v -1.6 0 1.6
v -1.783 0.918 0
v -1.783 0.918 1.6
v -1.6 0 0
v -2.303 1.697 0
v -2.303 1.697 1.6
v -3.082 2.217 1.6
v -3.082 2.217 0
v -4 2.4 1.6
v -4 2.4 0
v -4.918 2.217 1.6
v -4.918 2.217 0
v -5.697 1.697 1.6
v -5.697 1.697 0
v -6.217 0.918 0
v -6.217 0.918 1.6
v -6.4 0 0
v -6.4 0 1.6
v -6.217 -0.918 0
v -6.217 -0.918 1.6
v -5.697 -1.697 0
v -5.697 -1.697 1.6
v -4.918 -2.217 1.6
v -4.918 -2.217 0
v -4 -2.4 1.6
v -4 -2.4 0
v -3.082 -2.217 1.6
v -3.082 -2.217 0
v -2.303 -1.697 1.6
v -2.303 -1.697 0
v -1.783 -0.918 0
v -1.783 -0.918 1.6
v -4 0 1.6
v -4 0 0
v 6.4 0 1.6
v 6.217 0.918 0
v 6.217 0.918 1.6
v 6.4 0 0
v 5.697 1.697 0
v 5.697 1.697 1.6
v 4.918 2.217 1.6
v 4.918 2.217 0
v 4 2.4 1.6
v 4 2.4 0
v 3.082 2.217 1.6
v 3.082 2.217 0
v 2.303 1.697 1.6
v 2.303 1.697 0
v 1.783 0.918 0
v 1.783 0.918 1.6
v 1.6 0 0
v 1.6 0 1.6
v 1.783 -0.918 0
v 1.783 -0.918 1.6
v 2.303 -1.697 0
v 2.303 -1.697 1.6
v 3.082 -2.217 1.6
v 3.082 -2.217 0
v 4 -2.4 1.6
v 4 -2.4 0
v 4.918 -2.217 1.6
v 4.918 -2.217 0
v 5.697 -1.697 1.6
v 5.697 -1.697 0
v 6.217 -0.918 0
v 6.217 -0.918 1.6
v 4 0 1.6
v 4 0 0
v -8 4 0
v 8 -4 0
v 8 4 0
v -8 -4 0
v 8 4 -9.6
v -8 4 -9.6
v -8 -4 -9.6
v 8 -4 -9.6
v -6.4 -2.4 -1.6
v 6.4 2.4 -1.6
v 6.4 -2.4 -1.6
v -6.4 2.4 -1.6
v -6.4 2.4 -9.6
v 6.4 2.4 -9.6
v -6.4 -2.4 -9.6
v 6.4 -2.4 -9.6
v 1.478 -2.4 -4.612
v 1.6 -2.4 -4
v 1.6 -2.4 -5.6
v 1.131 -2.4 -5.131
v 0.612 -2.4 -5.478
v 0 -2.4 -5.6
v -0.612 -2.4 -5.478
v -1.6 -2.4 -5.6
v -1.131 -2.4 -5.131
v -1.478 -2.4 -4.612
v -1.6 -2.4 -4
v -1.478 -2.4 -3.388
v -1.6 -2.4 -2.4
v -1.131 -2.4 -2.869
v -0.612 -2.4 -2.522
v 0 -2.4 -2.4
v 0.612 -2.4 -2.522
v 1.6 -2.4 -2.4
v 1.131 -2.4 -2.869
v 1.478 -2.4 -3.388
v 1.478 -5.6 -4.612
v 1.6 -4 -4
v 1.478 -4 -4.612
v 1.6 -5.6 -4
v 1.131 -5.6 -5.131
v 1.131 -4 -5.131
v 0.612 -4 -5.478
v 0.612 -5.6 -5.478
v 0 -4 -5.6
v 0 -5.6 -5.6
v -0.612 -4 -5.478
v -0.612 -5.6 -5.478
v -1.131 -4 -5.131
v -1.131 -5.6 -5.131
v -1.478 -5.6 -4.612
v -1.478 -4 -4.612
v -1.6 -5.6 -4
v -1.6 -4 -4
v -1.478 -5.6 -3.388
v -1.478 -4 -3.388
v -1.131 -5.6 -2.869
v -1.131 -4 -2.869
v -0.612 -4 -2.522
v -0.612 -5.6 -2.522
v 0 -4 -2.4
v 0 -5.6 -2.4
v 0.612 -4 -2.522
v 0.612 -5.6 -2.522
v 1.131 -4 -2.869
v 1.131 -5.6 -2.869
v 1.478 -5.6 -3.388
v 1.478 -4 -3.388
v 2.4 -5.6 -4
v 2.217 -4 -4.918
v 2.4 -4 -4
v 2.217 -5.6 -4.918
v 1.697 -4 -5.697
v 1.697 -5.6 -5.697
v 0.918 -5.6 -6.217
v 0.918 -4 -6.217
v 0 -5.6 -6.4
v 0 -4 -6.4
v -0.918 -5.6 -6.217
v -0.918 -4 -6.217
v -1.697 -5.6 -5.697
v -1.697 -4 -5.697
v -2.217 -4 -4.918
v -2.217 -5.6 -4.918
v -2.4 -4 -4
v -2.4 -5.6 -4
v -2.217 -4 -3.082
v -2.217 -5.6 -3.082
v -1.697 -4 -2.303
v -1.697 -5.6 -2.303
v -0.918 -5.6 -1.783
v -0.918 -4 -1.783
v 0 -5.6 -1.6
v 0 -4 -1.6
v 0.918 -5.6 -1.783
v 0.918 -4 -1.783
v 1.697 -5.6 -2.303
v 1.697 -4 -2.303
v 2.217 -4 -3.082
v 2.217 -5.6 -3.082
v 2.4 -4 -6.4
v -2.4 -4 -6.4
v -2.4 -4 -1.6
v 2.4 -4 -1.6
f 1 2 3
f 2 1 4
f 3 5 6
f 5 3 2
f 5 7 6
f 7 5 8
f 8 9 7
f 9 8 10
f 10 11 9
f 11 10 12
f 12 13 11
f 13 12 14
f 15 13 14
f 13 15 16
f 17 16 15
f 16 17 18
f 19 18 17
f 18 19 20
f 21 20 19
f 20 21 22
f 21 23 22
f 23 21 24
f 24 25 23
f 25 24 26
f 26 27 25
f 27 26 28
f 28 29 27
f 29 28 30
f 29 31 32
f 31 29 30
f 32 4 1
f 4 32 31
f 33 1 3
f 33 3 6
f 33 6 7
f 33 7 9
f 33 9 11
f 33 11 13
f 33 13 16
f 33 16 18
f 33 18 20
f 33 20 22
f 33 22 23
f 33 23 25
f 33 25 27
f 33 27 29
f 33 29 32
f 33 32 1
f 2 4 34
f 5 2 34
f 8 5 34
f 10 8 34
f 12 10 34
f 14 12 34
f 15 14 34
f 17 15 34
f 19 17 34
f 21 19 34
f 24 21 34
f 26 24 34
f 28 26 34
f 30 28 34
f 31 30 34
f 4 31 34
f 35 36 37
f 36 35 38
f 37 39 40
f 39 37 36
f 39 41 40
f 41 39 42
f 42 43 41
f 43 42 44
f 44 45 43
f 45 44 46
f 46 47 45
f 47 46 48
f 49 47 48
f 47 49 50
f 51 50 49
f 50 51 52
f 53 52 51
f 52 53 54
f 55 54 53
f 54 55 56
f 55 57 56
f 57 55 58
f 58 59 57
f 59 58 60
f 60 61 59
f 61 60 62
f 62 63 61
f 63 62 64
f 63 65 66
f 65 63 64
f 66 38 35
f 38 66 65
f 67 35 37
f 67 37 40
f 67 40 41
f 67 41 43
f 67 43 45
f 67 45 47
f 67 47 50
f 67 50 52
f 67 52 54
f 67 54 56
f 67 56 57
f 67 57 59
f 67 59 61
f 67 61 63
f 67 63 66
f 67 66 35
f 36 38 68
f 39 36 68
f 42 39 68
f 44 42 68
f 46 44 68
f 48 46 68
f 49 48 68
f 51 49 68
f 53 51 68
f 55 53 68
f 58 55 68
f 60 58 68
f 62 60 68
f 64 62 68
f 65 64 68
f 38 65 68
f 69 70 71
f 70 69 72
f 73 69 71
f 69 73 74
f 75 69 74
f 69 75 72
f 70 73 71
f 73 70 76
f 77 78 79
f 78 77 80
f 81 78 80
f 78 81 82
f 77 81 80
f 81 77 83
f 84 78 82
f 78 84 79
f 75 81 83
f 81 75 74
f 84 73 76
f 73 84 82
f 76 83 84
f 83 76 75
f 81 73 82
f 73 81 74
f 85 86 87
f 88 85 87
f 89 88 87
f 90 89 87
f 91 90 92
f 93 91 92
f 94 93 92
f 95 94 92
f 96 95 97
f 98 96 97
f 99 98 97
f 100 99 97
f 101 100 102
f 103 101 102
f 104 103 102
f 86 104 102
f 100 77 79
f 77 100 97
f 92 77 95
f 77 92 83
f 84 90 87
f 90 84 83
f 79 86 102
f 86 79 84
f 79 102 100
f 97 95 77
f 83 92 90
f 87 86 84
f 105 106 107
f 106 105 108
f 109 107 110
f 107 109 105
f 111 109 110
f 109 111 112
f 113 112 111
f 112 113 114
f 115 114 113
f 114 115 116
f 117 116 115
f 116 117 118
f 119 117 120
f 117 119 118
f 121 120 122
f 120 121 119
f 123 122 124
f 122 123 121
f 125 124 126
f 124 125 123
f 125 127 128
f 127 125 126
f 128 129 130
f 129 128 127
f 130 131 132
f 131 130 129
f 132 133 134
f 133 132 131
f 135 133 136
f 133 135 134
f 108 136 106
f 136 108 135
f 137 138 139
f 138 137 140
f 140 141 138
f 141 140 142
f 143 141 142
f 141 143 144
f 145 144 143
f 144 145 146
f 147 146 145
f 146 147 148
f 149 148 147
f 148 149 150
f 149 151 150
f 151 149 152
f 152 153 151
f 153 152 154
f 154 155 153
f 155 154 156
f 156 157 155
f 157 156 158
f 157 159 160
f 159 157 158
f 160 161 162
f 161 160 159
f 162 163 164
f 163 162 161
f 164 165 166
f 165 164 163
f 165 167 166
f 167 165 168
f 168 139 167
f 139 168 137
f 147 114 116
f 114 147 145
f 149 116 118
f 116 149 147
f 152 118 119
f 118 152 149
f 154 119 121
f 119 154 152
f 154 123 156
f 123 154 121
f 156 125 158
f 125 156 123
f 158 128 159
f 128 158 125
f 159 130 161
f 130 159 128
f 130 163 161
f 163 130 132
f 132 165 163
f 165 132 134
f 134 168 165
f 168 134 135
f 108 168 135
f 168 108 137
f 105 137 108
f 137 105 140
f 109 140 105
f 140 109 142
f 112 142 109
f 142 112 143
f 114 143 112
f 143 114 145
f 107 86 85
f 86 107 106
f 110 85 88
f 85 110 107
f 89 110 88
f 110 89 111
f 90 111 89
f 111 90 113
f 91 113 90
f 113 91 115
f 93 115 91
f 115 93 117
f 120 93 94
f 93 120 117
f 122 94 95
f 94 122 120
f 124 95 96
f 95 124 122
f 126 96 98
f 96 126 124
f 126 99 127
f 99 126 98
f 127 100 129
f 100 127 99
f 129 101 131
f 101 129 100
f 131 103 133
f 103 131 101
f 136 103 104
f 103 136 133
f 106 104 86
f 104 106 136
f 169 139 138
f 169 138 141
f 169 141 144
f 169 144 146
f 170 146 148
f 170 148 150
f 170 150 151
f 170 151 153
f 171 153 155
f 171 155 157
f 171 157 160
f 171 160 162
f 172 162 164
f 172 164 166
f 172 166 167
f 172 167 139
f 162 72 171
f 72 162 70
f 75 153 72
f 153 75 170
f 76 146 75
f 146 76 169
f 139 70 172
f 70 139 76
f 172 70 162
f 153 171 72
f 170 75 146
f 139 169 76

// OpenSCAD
// file: ../p/4-4disc.scad
use <../lib.scad>
function ldraw_lib__4_4disc() = [
// 0 Disc 1.0
// 0 Name: 4-4disc.dat
// 0 Author: James Jessiman
// 0 !LDRAW_ORG Primitive UPDATE 2002-02
// 0 !LICENSE Licensed under CC BY 2.0 and CC BY 4.0 : see CAreadme.txt
// 
// 0 BFC CERTIFY CCW
  [0,"BFC","CERTIFY"],
  [0,"BFC","CCW"],
// 
// 0 !HISTORY 1998-12-15 [PTadmin] Official Update 1998-10
// 0 !HISTORY 2002-03-23 [sbliss] Added BFC statement
// 0 !HISTORY 2002-04-25 [PTadmin] Official Update 2002-02
// 0 !HISTORY 2007-06-24 [PTadmin] Header formatted for Contributor Agreement
// 0 !HISTORY 2008-07-01 [PTadmin] Official Update 2008-01
// 
// 
// 3 16 0 0 0 1 0 0 0.9239 0 0.3827
  [3,16,0,0,0,1,0,0,0.9239,0,0.3827],
// 3 16 0 0 0 0.9239 0 0.3827 0.7071 0 0.7071
  [3,16,0,0,0,0.9239,0,0.3827,0.7071,0,0.7071],
// 3 16 0 0 0 0.7071 0 0.7071 0.3827 0 0.9239
  [3,16,0,0,0,0.7071,0,0.7071,0.3827,0,0.9239],
// 3 16 0 0 0 0.3827 0 0.9239 0 0 1
  [3,16,0,0,0,0.3827,0,0.9239,0,0,1],
// 3 16 0 0 0 0 0 1 -0.3827 0 0.9239
  [3,16,0,0,0,0,0,1,-0.3827,0,0.9239],
// 3 16 0 0 0 -0.3827 0 0.9239 -0.7071 0 0.7071
  [3,16,0,0,0,-0.3827,0,0.9239,-0.7071,0,0.7071],
// 3 16 0 0 0 -0.7071 0 0.7071 -0.9239 0 0.3827
  [3,16,0,0,0,-0.7071,0,0.7071,-0.9239,0,0.3827],
// 3 16 0 0 0 -0.9239 0 0.3827 -1 0 -0
  [3,16,0,0,0,-0.9239,0,0.3827,-1,0,-0],
// 3 16 0 0 0 -1 0 -0 -0.9239 0 -0.3827
  [3,16,0,0,0,-1,0,-0,-0.9239,0,-0.3827],
// 3 16 0 0 0 -0.9239 0 -0.3827 -0.7071 0 -0.7071
  [3,16,0,0,0,-0.9239,0,-0.3827,-0.7071,0,-0.7071],
// 3 16 0 0 0 -0.7071 0 -0.7071 -0.3827 0 -0.9239
  [3,16,0,0,0,-0.7071,0,-0.7071,-0.3827,0,-0.9239],
// 3 16 0 0 0 -0.3827 0 -0.9239 0 0 -1
  [3,16,0,0,0,-0.3827,0,-0.9239,0,0,-1],
// 3 16 0 0 0 0 0 -1 0.3827 0 -0.9239
  [3,16,0,0,0,0,0,-1,0.3827,0,-0.9239],
// 3 16 0 0 0 0.3827 0 -0.9239 0.7071 0 -0.7071
  [3,16,0,0,0,0.3827,0,-0.9239,0.7071,0,-0.7071],
// 3 16 0 0 0 0.7071 0 -0.7071 0.9239 0 -0.3827
  [3,16,0,0,0,0.7071,0,-0.7071,0.9239,0,-0.3827],
// 3 16 0 0 0 0.9239 0 -0.3827 1 0 0
  [3,16,0,0,0,0.9239,0,-0.3827,1,0,0],
// 0
];
module ldraw_lib__4_4disc(step=0, col=false, unit=2/5, alt=false, line=0.2, solid=!$preview)
    makepoly(ldraw_lib__4_4disc(), step=step, col=col, unit=unit, alt=alt, line=line, solid=solid);
ldraw_lib__4_4disc(line=0.2);
// file: ../p/stud.scad
use <../lib.scad>
use <4-4cyli.scad>
use <4-4disc.scad>
use <4-4edge.scad>
function ldraw_lib__stud() = [
// 0 Stud
// 0 Name: stud.dat
// 0 Author: James Jessiman
// 0 !LDRAW_ORG Primitive UPDATE 2012-01
// 0 !LICENSE Licensed under CC BY 4.0 : see CAreadme.txt
// 
// 0 BFC CERTIFY CCW
  [0,"BFC","CERTIFY"],
  [0,"BFC","CCW"],
// 
// 0 !HISTORY 2002-04-04 [sbliss] Modified for BFC compliance
// 0 !HISTORY 2002-04-25 [PTadmin] Official Update 2002-02
// 0 !HISTORY 2007-06-24 [PTadmin] Header formatted for Contributor Agreement
// 0 !HISTORY 2008-07-01 [PTadmin] Official Update 2008-01
// 0 !HISTORY 2012-02-16 [Philo] Changed to CCW
// 0 !HISTORY 2012-03-30 [PTadmin] Official Update 2012-01
// 
// 
// 1 16 0 0 0 6 0 0 0 1 0 0 0 6 4-4edge.dat
  [1,16,0,0,0,6,0,0,0,1,0,0,0,6, ldraw_lib__4_4edge()],
// 1 16 0 -4 0 6 0 0 0 1 0 0 0 6 4-4edge.dat
  [1,16,0,-4,0,6,0,0,0,1,0,0,0,6, ldraw_lib__4_4edge()],
// 1 16 0 0 0 6 0 0 0 -4 0 0 0 6 4-4cyli.dat
  [1,16,0,0,0,6,0,0,0,-4,0,0,0,6, ldraw_lib__4_4cyli()],
// 1 16 0 -4 0 6 0 0 0 1 0 0 0 6 4-4disc.dat
  [1,16,0,-4,0,6,0,0,0,1,0,0,0,6, ldraw_lib__4_4disc()],
  [-1,16,0,0,0,6,0,0,0,-1,0,0,0,6, ldraw_lib__4_4disc()],
];
module ldraw_lib__stud(step=0, col=false, unit=2/5, alt=false, line=0.2, solid=!$preview)
    makepoly(ldraw_lib__stud(), step=step, col=col, unit=unit, alt=alt, line=line, solid=solid);
ldraw_lib__stud(line=0.2);
// file: ../p/4-4ring2.scad
use <../lib.scad>
$fa=1; $fs=0.2;
function ldraw_lib__4_4ring2(realsolid=false) = [
// 0 Ring  2 x 1.0
// 0 Name: 4-4ring2.dat
// 0 Author: James Jessiman
// 0 !LDRAW_ORG Primitive UPDATE 2009-01
// 0 !LICENSE Licensed under CC BY 2.0 and CC BY 4.0 : see CAreadme.txt
// 
// 0 BFC CERTIFY CCW
  [0,"BFC","CERTIFY"],
  [0,"BFC","CCW"],
// 
// 0 !HISTORY 1998-12-15 [PTadmin] Official Update 1998-10
// 0 !HISTORY 2002-04-05 [hafhead] Added BFC statement
// 0 !HISTORY 2002-04-25 [PTadmin] Official Update 2002-02
// 0 !HISTORY 2007-06-24 [PTadmin] Header formatted for Contributor Agreement
// 0 !HISTORY 2008-07-01 [PTadmin] Official Update 2008-01
// 0 !HISTORY 2008-08-26 [cwdee] Switch polygon winding and rename
// 0 !HISTORY 2009-05-02 [PTadmin] Official Update 2009-01
// 
// 
// 4 16 -1.1481 0 2.7717 -0.7654 0 1.8478 0 0 2 0 0 3
  [4,16,-1.1481,0,2.7717,-0.7654,0,1.8478,0,0,2,0,0,3],
// 4 16 -2.1213 0 2.1213 -1.4142 0 1.4142 -0.7654 0 1.8478 -1.1481 0 2.7717
  [4,16,-2.1213,0,2.1213,-1.4142,0,1.4142,-0.7654,0,1.8478,-1.1481,0,2.7717],
// 4 16 -2.7717 0 1.1481 -1.8478 0 0.7654 -1.4142 0 1.4142 -2.1213 0 2.1213
  [4,16,-2.7717,0,1.1481,-1.8478,0,0.7654,-1.4142,0,1.4142,-2.1213,0,2.1213],
// 4 16 -3 0 0 -2 0 0 -1.8478 0 0.7654 -2.7717 0 1.1481
  [4,16,-3,0,0,-2,0,0,-1.8478,0,0.7654,-2.7717,0,1.1481],
// 4 16 -2.7717 0 -1.1481 -1.8478 0 -0.7654 -2 0 0 -3 0 0
  [4,16,-2.7717,0,-1.1481,-1.8478,0,-0.7654,-2,0,0,-3,0,0],
// 4 16 -2.1213 0 -2.1213 -1.4142 0 -1.4142 -1.8478 0 -0.7654 -2.7717 0 -1.1481
  [4,16,-2.1213,0,-2.1213,-1.4142,0,-1.4142,-1.8478,0,-0.7654,-2.7717,0,-1.1481],
// 4 16 -1.1481 0 -2.7717 -0.7654 0 -1.8478 -1.4142 0 -1.4142 -2.1213 0 -2.1213
  [4,16,-1.1481,0,-2.7717,-0.7654,0,-1.8478,-1.4142,0,-1.4142,-2.1213,0,-2.1213],
// 4 16 0 0 -3 0 0 -2 -0.7654 0 -1.8478 -1.1481 0 -2.7717
  [4,16,0,0,-3,0,0,-2,-0.7654,0,-1.8478,-1.1481,0,-2.7717],
// 4 16 1.1481 0 -2.7717 0.7654 0 -1.8478 0 0 -2 0 0 -3
  [4,16,1.1481,0,-2.7717,0.7654,0,-1.8478,0,0,-2,0,0,-3],
// 4 16 2.1213 0 -2.1213 1.4142 0 -1.4142 0.7654 0 -1.8478 1.1481 0 -2.7717
  [4,16,2.1213,0,-2.1213,1.4142,0,-1.4142,0.7654,0,-1.8478,1.1481,0,-2.7717],
// 4 16 2.7717 0 -1.1481 1.8478 0 -0.7654 1.4142 0 -1.4142 2.1213 0 -2.1213
  [4,16,2.7717,0,-1.1481,1.8478,0,-0.7654,1.4142,0,-1.4142,2.1213,0,-2.1213],
// 4 16 3 0 0 2 0 0 1.8478 0 -0.7654 2.7717 0 -1.1481
  [4,16,3,0,0,2,0,0,1.8478,0,-0.7654,2.7717,0,-1.1481],
// 4 16 2.7717 0 1.1481 1.8478 0 0.7654 2 0 0 3 0 0
  [4,16,2.7717,0,1.1481,1.8478,0,0.7654,2,0,0,3,0,0],
// 4 16 2.1213 0 2.1213 1.4142 0 1.4142 1.8478 0 0.7654 2.7717 0 1.1481
  [4,16,2.1213,0,2.1213,1.4142,0,1.4142,1.8478,0,0.7654,2.7717,0,1.1481],
// 4 16 1.1481 0 2.7717 0.7654 0 1.8478 1.4142 0 1.4142 2.1213 0 2.1213
  [4,16,1.1481,0,2.7717,0.7654,0,1.8478,1.4142,0,1.4142,2.1213,0,2.1213],
// 4 16 0 0 3 0 0 2 0.7654 0 1.8478 1.1481 0 2.7717
  [4,16,0,0,3,0,0,2,0.7654,0,1.8478,1.1481,0,2.7717],
// 0
];
module ldraw_lib__4_4ring2(step=0, col=false, unit=2/5, alt=false, line=0.2, solid=!$preview)
    makepoly(ldraw_lib__4_4ring2(solid), step=step, col=col, unit=unit, alt=alt, line=line, solid=solid);
ldraw_lib__4_4ring2(line=0.2);
// file: ../p/stug-1x2.scad
use <../lib.scad>
use <stud.scad>
$fa=1; $fs=0.2;
function ldraw_lib__stug_1x2(realsolid=false) = [
// 0 Stud Group  1 x  2
// 0 Name: stug-1x2.dat
// 0 Author: Steffen [Steffen]
// 0 !LDRAW_ORG Primitive UPDATE 2011-01
// 0 !LICENSE Licensed under CC BY 2.0 and CC BY 4.0 : see CAreadme.txt
// 
// 0 BFC CERTIFY CCW
  [0,"BFC","CERTIFY"],
  [0,"BFC","CCW"],
// 
// 0 !HISTORY 2011-07-25 [PTadmin] Official Update 2011-01
// 
// 
// 1 16 -10 0 0 1 0 0 0 1 0 0 0 1 stud.dat
  [1,16,-10,0,0,1,0,0,0,1,0,0,0,1, ldraw_lib__stud(realsolid)],
// 1 16 10 0 0 1 0 0 0 1 0 0 0 1 stud.dat
  [1,16,10,0,0,1,0,0,0,1,0,0,0,1, ldraw_lib__stud(realsolid)],
];
module ldraw_lib__stug_1x2(step=0, col=false, unit=2/5, alt=false, line=0.2, solid=!$preview)
    makepoly(ldraw_lib__stug_1x2(solid), step=step, col=col, unit=unit, alt=alt, line=line, solid=solid);
ldraw_lib__stug_1x2(line=0.2);
// file: ../p/stud2a.scad
use <../lib.scad>
use <4-4cyli.scad>
use <4-4edge.scad>
use <4-4ring2.scad>
function ldraw_lib__stud2a() = [
// 0 Stud Open without Base Edges
// 0 Name: stud2a.dat
// 0 Author: James Jessiman
// 0 !LDRAW_ORG Primitive UPDATE 2009-02
// 0 !LICENSE Licensed under CC BY 2.0 and CC BY 4.0 : see CAreadme.txt
// 
// 0 BFC CERTIFY CCW
  [0,"BFC","CERTIFY"],
  [0,"BFC","CCW"],
// 
// 0 !HISTORY 1999-07-05 [PTadmin] Official Update 1999-05
// 0 !HISTORY 2002-04-04 [sbliss] Modified for BFC compliance
// 0 !HISTORY 2002-04-25 [PTadmin] Official Update 2002-02
// 0 !HISTORY 2007-06-24 [PTadmin] Header formatted for Contributor Agreement
// 0 !HISTORY 2008-07-01 [PTadmin] Official Update 2008-01
// 0 !HISTORY 2009-06-21 [cwdee] Update ring references to 4-4ring
// 0 !HISTORY 2009-09-03 [PTadmin] Official Update 2009-02
// 
// 
// 1 16 0 -4 0 4 0 0 0 1 0 0 0 4 4-4edge.dat
  [1,16,0,-4,0,4,0,0,0,1,0,0,0,4, ldraw_lib__4_4edge()],
// 1 16 0 -4 0 6 0 0 0 1 0 0 0 6 4-4edge.dat
  [1,16,0,-4,0,6,0,0,0,1,0,0,0,6, ldraw_lib__4_4edge()],
// 0 BFC INVERTNEXT
  [0,"BFC","INVERTNEXT"],
// 1 16 0 -4 0 4 0 0 0 4 0 0 0 4 4-4cyli.dat
  [1,16,0,-4,0,4,0,0,0,4,0,0,0,4, ldraw_lib__4_4cyli()],
// 1 16 0 -4 0 6 0 0 0 4 0 0 0 6 4-4cyli.dat
  [1,16,0,-4,0,6,0,0,0,4,0,0,0,6, ldraw_lib__4_4cyli()],
// 1 16 0 -4 0 2 0 0 0 1 0 0 0 2 4-4ring2.dat
  [1,16,0,-4,0,2,0,0,0,1,0,0,0,2, ldraw_lib__4_4ring2()],
// 0
];
makepoly(ldraw_lib__stud2a(), line=0.2);
// file: ../p/box4t.scad
use <../lib.scad>
function ldraw_lib__box4t() = [
// 0 Box with 4 Adjacent Faces and All Edges
// 0 Name: box4t.dat
// 0 Author: Tore Eriksson [Tore_Eriksson]
// 0 !LDRAW_ORG Primitive UPDATE 2003-02
// 0 !LICENSE Licensed under CC BY 2.0 and CC BY 4.0 : see CAreadme.txt
// 
// 0 BFC CERTIFY CCW
  [0,"BFC","CERTIFY"],
  [0,"BFC","CCW"],
// 
// 0 !HISTORY 1997-09-29 [PTadmin] Official Update 1997-15
// 0 !HISTORY 2002-08-31 [izanette] Modified with WINDZ for BFC compliance
// 0 !HISTORY 2003-08-01 [PTadmin] Official Update 2003-02
// 0 !HISTORY 2007-06-24 [PTadmin] Header formatted for Contributor Agreement
// 0 !HISTORY 2008-07-01 [PTadmin] Official Update 2008-01
// 
// 
// 2 24 1 1 1 -1 1 1
  [2,24,1,1,1,-1,1,1],
// 2 24 -1 1 1 -1 1 -1
  [2,24,-1,1,1,-1,1,-1],
// 2 24 -1 1 -1 1 1 -1
  [2,24,-1,1,-1,1,1,-1],
// 2 24 1 1 -1 1 1 1
  [2,24,1,1,-1,1,1,1],
// 2 24 1 0 1 -1 0 1
  [2,24,1,0,1,-1,0,1],
// 2 24 -1 0 1 -1 0 -1
  [2,24,-1,0,1,-1,0,-1],
// 2 24 -1 0 -1 1 0 -1
  [2,24,-1,0,-1,1,0,-1],
// 2 24 1 0 -1 1 0 1
  [2,24,1,0,-1,1,0,1],
// 2 24 1 0 1 1 1 1
  [2,24,1,0,1,1,1,1],
// 2 24 -1 0 1 -1 1 1
  [2,24,-1,0,1,-1,1,1],
// 2 24 1 0 -1 1 1 -1
  [2,24,1,0,-1,1,1,-1],
// 2 24 -1 0 -1 -1 1 -1
  [2,24,-1,0,-1,-1,1,-1],
// 4 16 1 1 1 1 1 -1 -1 1 -1 -1 1 1
  [4,16,1,1,1,1,1,-1,-1,1,-1,-1,1,1],
// 4 16 1 1 1 -1 1 1 -1 0 1 1 0 1
  [4,16,1,1,1,-1,1,1,-1,0,1,1,0,1],
// 4 16 -1 1 1 -1 1 -1 -1 0 -1 -1 0 1
  [4,16,-1,1,1,-1,1,-1,-1,0,-1,-1,0,1],
// 0 4 16 -1 1 -1 -1 0 -1 1 0 -1 1 1 -1
// 4 16 1 1 -1 1 1 1 1 0 1 1 0 -1
  [4,16,1,1,-1,1,1,1,1,0,1,1,0,-1],
// 0
];
makepoly(ldraw_lib__box4t(), line=0.2);
// file: ../p/4-4ndis.scad
use <../lib.scad>
function ldraw_lib__4_4ndis() = [
// 0 Disc Negative 1.0
// 0 Name: 4-4ndis.dat
// 0 Author: James Jessiman
// 0 !LDRAW_ORG Primitive UPDATE 2012-01
// 0 !LICENSE Licensed under CC BY 2.0 and CC BY 4.0 : see CAreadme.txt
// 
// 0 BFC CERTIFY CCW
  [0,"BFC","CERTIFY"],
  [0,"BFC","CCW"],
// 
// 0 !HISTORY 2002-03-23 [sbliss] Added BFC statement; compacted code
// 0 !HISTORY 2002-04-25 [PTadmin] Official Update 2002-02
// 0 !HISTORY 2007-06-24 [PTadmin] Header formatted for Contributor Agreement
// 0 !HISTORY 2008-07-01 [PTadmin] Official Update 2008-01
// 0 !HISTORY 2012-02-16 [Philo] Changed to CCW
// 0 !HISTORY 2012-03-30 [PTadmin] Official Update 2012-01
// 
// 
// 3 16 0.9239 0 0.3827 1 0 0 1 0 1
  [3,16,0.9239,0,0.3827,1,0,0,1,0,1],
// 3 16 0.7071 0 0.7071 0.9239 0 0.3827 1 0 1
  [3,16,0.7071,0,0.7071,0.9239,0,0.3827,1,0,1],
// 3 16 0.3827 0 0.9239 0.7071 0 0.7071 1 0 1
  [3,16,0.3827,0,0.9239,0.7071,0,0.7071,1,0,1],
// 3 16 0 0 1 0.3827 0 0.9239 1 0 1
  [3,16,0,0,1,0.3827,0,0.9239,1,0,1],
// 3 16 -0.3827 0 0.9239 0 0 1 -1 0 1
  [3,16,-0.3827,0,0.9239,0,0,1,-1,0,1],
// 3 16 -0.7071 0 0.7071 -0.3827 0 0.9239 -1 0 1
  [3,16,-0.7071,0,0.7071,-0.3827,0,0.9239,-1,0,1],
// 3 16 -0.9239 0 0.3827 -0.7071 0 0.7071 -1 0 1
  [3,16,-0.9239,0,0.3827,-0.7071,0,0.7071,-1,0,1],
// 3 16 -1 0 0 -0.9239 0 0.3827 -1 0 1
  [3,16,-1,0,0,-0.9239,0,0.3827,-1,0,1],
// 3 16 -0.9239 0 -0.3827 -1 0 0 -1 0 -1
  [3,16,-0.9239,0,-0.3827,-1,0,0,-1,0,-1],
// 3 16 -0.7071 0 -0.7071 -0.9239 0 -0.3827 -1 0 -1
  [3,16,-0.7071,0,-0.7071,-0.9239,0,-0.3827,-1,0,-1],
// 3 16 -0.3827 0 -0.9239 -0.7071 0 -0.7071 -1 0 -1
  [3,16,-0.3827,0,-0.9239,-0.7071,0,-0.7071,-1,0,-1],
// 3 16 0 0 -1 -0.3827 0 -0.9239 -1 0 -1
  [3,16,0,0,-1,-0.3827,0,-0.9239,-1,0,-1],
// 3 16 0.3827 0 -0.9239 0 0 -1 1 0 -1
  [3,16,0.3827,0,-0.9239,0,0,-1,1,0,-1],
// 3 16 0.7071 0 -0.7071 0.3827 0 -0.9239 1 0 -1
  [3,16,0.7071,0,-0.7071,0.3827,0,-0.9239,1,0,-1],
// 3 16 0.9239 0 -0.3827 0.7071 0 -0.7071 1 0 -1
  [3,16,0.9239,0,-0.3827,0.7071,0,-0.7071,1,0,-1],
// 3 16 1 0 0 0.9239 0 -0.3827 1 0 -1
  [3,16,1,0,0,0.9239,0,-0.3827,1,0,-1],
];
module ldraw_lib__4_4ndis(step=0, col=false, unit=2/5, alt=false, line=0.2, solid=!$preview)
    makepoly(ldraw_lib__4_4ndis(), step=step, col=col, unit=unit, alt=alt, line=line, solid=solid);
ldraw_lib__4_4ndis(line=0.2);
// file: ../p/4-4edge.scad
use <../lib.scad>
function ldraw_lib__4_4edge() = [
// 0 Circle 1.0
// 0 Name: 4-4edge.dat
// 0 Author: James Jessiman
// 0 !LDRAW_ORG Primitive UPDATE 2017-01
// 0 !LICENSE Licensed under CC BY 2.0 and CC BY 4.0 : see CAreadme.txt
// 
// 0 BFC CERTIFY CCW
  [0,"BFC","CERTIFY"],
  [0,"BFC","CCW"],
// 
// 0 !HISTORY 1998-12-15 [PTadmin] Official Update 1998-10
// 0 !HISTORY 2005-12-28 [PTadmin] Official Update 2005-01
// 0 !HISTORY 2007-06-24 [PTadmin] Header formatted for Contributor Agreement
// 0 !HISTORY 2008-07-01 [PTadmin] Official Update 2008-01
// 0 !HISTORY 2017-01-15 [Steffen] BFCed
// 0 !HISTORY 2017-12-30 [PTadmin] Official Update 2017-01
// 
// 
// 2 24 1 0 0 0.9239 0 0.3827
  [2,24,1,0,0,0.9239,0,0.3827],
// 2 24 0.9239 0 0.3827 0.7071 0 0.7071
  [2,24,0.9239,0,0.3827,0.7071,0,0.7071],
// 2 24 0.7071 0 0.7071 0.3827 0 0.9239
  [2,24,0.7071,0,0.7071,0.3827,0,0.9239],
// 2 24 0.3827 0 0.9239 0 0 1
  [2,24,0.3827,0,0.9239,0,0,1],
// 2 24 0 0 1 -0.3827 0 0.9239
  [2,24,0,0,1,-0.3827,0,0.9239],
// 2 24 -0.3827 0 0.9239 -0.7071 0 0.7071
  [2,24,-0.3827,0,0.9239,-0.7071,0,0.7071],
// 2 24 -0.7071 0 0.7071 -0.9239 0 0.3827
  [2,24,-0.7071,0,0.7071,-0.9239,0,0.3827],
// 2 24 -0.9239 0 0.3827 -1 0 -0
  [2,24,-0.9239,0,0.3827,-1,0,-0],
// 2 24 -1 0 -0 -0.9239 0 -0.3827
  [2,24,-1,0,-0,-0.9239,0,-0.3827],
// 2 24 -0.9239 0 -0.3827 -0.7071 0 -0.7071
  [2,24,-0.9239,0,-0.3827,-0.7071,0,-0.7071],
// 2 24 -0.7071 0 -0.7071 -0.3827 0 -0.9239
  [2,24,-0.7071,0,-0.7071,-0.3827,0,-0.9239],
// 2 24 -0.3827 0 -0.9239 0 0 -1
  [2,24,-0.3827,0,-0.9239,0,0,-1],
// 2 24 0 0 -1 0.3827 0 -0.9239
  [2,24,0,0,-1,0.3827,0,-0.9239],
// 2 24 0.3827 0 -0.9239 0.7071 0 -0.7071
  [2,24,0.3827,0,-0.9239,0.7071,0,-0.7071],
// 2 24 0.7071 0 -0.7071 0.9239 0 -0.3827
  [2,24,0.7071,0,-0.7071,0.9239,0,-0.3827],
// 2 24 0.9239 0 -0.3827 1 0 0
  [2,24,0.9239,0,-0.3827,1,0,0],
];
module ldraw_lib__4_4edge(step=0, col=false, unit=2/5, alt=false, line=0.2, solid=!$preview)
    makepoly(ldraw_lib__4_4edge(), step=step, col=col, unit=unit, alt=alt, line=line, solid=solid);
ldraw_lib__4_4edge(line=0.2);
// file: ../p/4-4cyli.scad
use <../lib.scad>
$fa=1; $fs=0.2;
function ldraw_lib__4_4cyli(realsolid=false) = [
// 0 Cylinder 1.0
// 0 Name: 4-4cyli.dat
// 0 Author: James Jessiman
// 0 !LDRAW_ORG Primitive UPDATE 2005-01
// 0 !LICENSE Licensed under CC BY 2.0 and CC BY 4.0 : see CAreadme.txt
// 
// 0 BFC CERTIFY CCW
  [0,"BFC","CERTIFY"],
  [0,"BFC","CCW"],
// 
// 0 !HISTORY 1998-12-15 [PTadmin] Official Update 1998-10
// 0 !HISTORY 2002-03-23 [sbliss] Added BFC statement; merged headers from files in distributions LDraw 0.27 and Complete.
// 0 !HISTORY 2002-04-25 [PTadmin] Official Update 2002-02
// 0 !HISTORY 2004-12-14 [guyvivan] BFC CCW
// 0 !HISTORY 2005-12-28 [PTadmin] Official Update 2005-01
// 0 !HISTORY 2007-06-24 [PTadmin] Header formatted for Contributor Agreement
// 0 !HISTORY 2008-07-01 [PTadmin] Official Update 2008-01
// 
// 
// 4 16 1 1 0 0.9239 1 0.3827 0.9239 0 0.3827 1 0 0
  [4,16,1,1,0,0.9239,1,0.3827,0.9239,0,0.3827,1,0,0],
// 5 24 1 0 0 1 1 0 0.9239 0 0.3827 0.9239 0 -0.3827
  [5,24,1,0,0,1,1,0,0.9239,0,0.3827,0.9239,0,-0.3827],
// 4 16 0.9239 1 0.3827 0.7071 1 0.7071 0.7071 0 0.7071 0.9239 0 0.3827
  [4,16,0.9239,1,0.3827,0.7071,1,0.7071,0.7071,0,0.7071,0.9239,0,0.3827],
// 5 24 0.9239 0 0.3827 0.9239 1 0.3827 0.7071 0 0.7071 1 0 0
  [5,24,0.9239,0,0.3827,0.9239,1,0.3827,0.7071,0,0.7071,1,0,0],
// 4 16 0.7071 1 0.7071 0.3827 1 0.9239 0.3827 0 0.9239 0.7071 0 0.7071
  [4,16,0.7071,1,0.7071,0.3827,1,0.9239,0.3827,0,0.9239,0.7071,0,0.7071],
// 5 24 0.7071 0 0.7071 0.7071 1 0.7071 0.3827 0 0.9239 0.9239 0 0.3827
  [5,24,0.7071,0,0.7071,0.7071,1,0.7071,0.3827,0,0.9239,0.9239,0,0.3827],
// 4 16 0.3827 1 0.9239 0 1 1 0 0 1 0.3827 0 0.9239
  [4,16,0.3827,1,0.9239,0,1,1,0,0,1,0.3827,0,0.9239],
// 5 24 0.3827 0 0.9239 0.3827 1 0.9239 0 0 1 0.7071 0 0.7071
  [5,24,0.3827,0,0.9239,0.3827,1,0.9239,0,0,1,0.7071,0,0.7071],
// 4 16 0 1 1 -0.3827 1 0.9239 -0.3827 0 0.9239 0 0 1
  [4,16,0,1,1,-0.3827,1,0.9239,-0.3827,0,0.9239,0,0,1],
// 5 24 0 0 1 0 1 1 -0.3827 0 0.9239 0.3827 0 0.9239
  [5,24,0,0,1,0,1,1,-0.3827,0,0.9239,0.3827,0,0.9239],
// 4 16 -0.3827 1 0.9239 -0.7071 1 0.7071 -0.7071 0 0.7071 -0.3827 0 0.9239
  [4,16,-0.3827,1,0.9239,-0.7071,1,0.7071,-0.7071,0,0.7071,-0.3827,0,0.9239],
// 5 24 -0.3827 0 0.9239 -0.3827 1 0.9239 -0.7071 0 0.7071 0 0 1
  [5,24,-0.3827,0,0.9239,-0.3827,1,0.9239,-0.7071,0,0.7071,0,0,1],
// 4 16 -0.7071 1 0.7071 -0.9239 1 0.3827 -0.9239 0 0.3827 -0.7071 0 0.7071
  [4,16,-0.7071,1,0.7071,-0.9239,1,0.3827,-0.9239,0,0.3827,-0.7071,0,0.7071],
// 5 24 -0.7071 0 0.7071 -0.7071 1 0.7071 -0.9239 0 0.3827 -0.3827 0 0.9239
  [5,24,-0.7071,0,0.7071,-0.7071,1,0.7071,-0.9239,0,0.3827,-0.3827,0,0.9239],
// 4 16 -0.9239 1 0.3827 -1 1 0 -1 0 0 -0.9239 0 0.3827
  [4,16,-0.9239,1,0.3827,-1,1,0,-1,0,0,-0.9239,0,0.3827],
// 5 24 -0.9239 0 0.3827 -0.9239 1 0.3827 -1 0 0 -0.7071 0 0.7071
  [5,24,-0.9239,0,0.3827,-0.9239,1,0.3827,-1,0,0,-0.7071,0,0.7071],
// 4 16 -1 1 0 -0.9239 1 -0.3827 -0.9239 0 -0.3827 -1 0 0
  [4,16,-1,1,0,-0.9239,1,-0.3827,-0.9239,0,-0.3827,-1,0,0],
// 5 24 -1 0 0 -1 1 0 -0.9239 0 -0.3827 -0.9239 0 0.3827
  [5,24,-1,0,0,-1,1,0,-0.9239,0,-0.3827,-0.9239,0,0.3827],
// 4 16 -0.9239 1 -0.3827 -0.7071 1 -0.7071 -0.7071 0 -0.7071 -0.9239 0 -0.3827
  [4,16,-0.9239,1,-0.3827,-0.7071,1,-0.7071,-0.7071,0,-0.7071,-0.9239,0,-0.3827],
// 5 24 -0.9239 0 -0.3827 -0.9239 1 -0.3827 -0.7071 0 -0.7071 -1 0 0
  [5,24,-0.9239,0,-0.3827,-0.9239,1,-0.3827,-0.7071,0,-0.7071,-1,0,0],
// 4 16 -0.7071 1 -0.7071 -0.3827 1 -0.9239 -0.3827 0 -0.9239 -0.7071 0 -0.7071
  [4,16,-0.7071,1,-0.7071,-0.3827,1,-0.9239,-0.3827,0,-0.9239,-0.7071,0,-0.7071],
// 5 24 -0.7071 0 -0.7071 -0.7071 1 -0.7071 -0.3827 0 -0.9239 -0.9239 0 -0.3827
  [5,24,-0.7071,0,-0.7071,-0.7071,1,-0.7071,-0.3827,0,-0.9239,-0.9239,0,-0.3827],
// 4 16 -0.3827 1 -0.9239 0 1 -1 0 0 -1 -0.3827 0 -0.9239
  [4,16,-0.3827,1,-0.9239,0,1,-1,0,0,-1,-0.3827,0,-0.9239],
// 5 24 -0.3827 0 -0.9239 -0.3827 1 -0.9239 0 0 -1 -0.7071 0 -0.7071
  [5,24,-0.3827,0,-0.9239,-0.3827,1,-0.9239,0,0,-1,-0.7071,0,-0.7071],
// 4 16 0 1 -1 0.3827 1 -0.9239 0.3827 0 -0.9239 0 0 -1
  [4,16,0,1,-1,0.3827,1,-0.9239,0.3827,0,-0.9239,0,0,-1],
// 5 24 0 0 -1 0 1 -1 0.3827 0 -0.9239 -0.3827 0 -0.9239
  [5,24,0,0,-1,0,1,-1,0.3827,0,-0.9239,-0.3827,0,-0.9239],
// 4 16 0.3827 1 -0.9239 0.7071 1 -0.7071 0.7071 0 -0.7071 0.3827 0 -0.9239
  [4,16,0.3827,1,-0.9239,0.7071,1,-0.7071,0.7071,0,-0.7071,0.3827,0,-0.9239],
// 5 24 0.3827 0 -0.9239 0.3827 1 -0.9239 0.7071 0 -0.7071 0 0 -1
  [5,24,0.3827,0,-0.9239,0.3827,1,-0.9239,0.7071,0,-0.7071,0,0,-1],
// 4 16 0.7071 1 -0.7071 0.9239 1 -0.3827 0.9239 0 -0.3827 0.7071 0 -0.7071
  [4,16,0.7071,1,-0.7071,0.9239,1,-0.3827,0.9239,0,-0.3827,0.7071,0,-0.7071],
// 5 24 0.7071 0 -0.7071 0.7071 1 -0.7071 0.9239 0 -0.3827 0.3827 0 -0.9239
  [5,24,0.7071,0,-0.7071,0.7071,1,-0.7071,0.9239,0,-0.3827,0.3827,0,-0.9239],
// 4 16 0.9239 1 -0.3827 1 1 0 1 0 0 0.9239 0 -0.3827
  [4,16,0.9239,1,-0.3827,1,1,0,1,0,0,0.9239,0,-0.3827],
// 5 24 0.9239 0 -0.3827 0.9239 1 -0.3827 1 0 0 0.7071 0 -0.7071
  [5,24,0.9239,0,-0.3827,0.9239,1,-0.3827,1,0,0,0.7071,0,-0.7071],
// 0
];
module ldraw_lib__4_4cyli(step=0, col=false, unit=2/5, alt=false, line=0.2, solid=!$preview)
    makepoly(ldraw_lib__4_4cyli(solid), step=step, col=col, unit=unit, alt=alt, line=line, solid=solid);
ldraw_lib__4_4cyli(line=0.2);
// main file
use <../lib.scad>
use <../p/4-4cyli.scad>
use <../p/4-4edge.scad>
use <../p/4-4ndis.scad>
use <../p/box4t.scad>
use <../p/stud2a.scad>
use <../p/stug-1x2.scad>
function ldraw_lib__7133() = [
// 0 Brick  1 x  2 with Centred Stud on Long Side without Bottom Stud Holder
// 0 Name: 7133.dat
// 0 Author: Rene Rechthaler [Blechtaler]
// 0 !LDRAW_ORG Part UPDATE 2025-07
// 0 !LICENSE Licensed under CC BY 4.0 : see CAreadme.txt
// 
// 0 BFC CERTIFY CCW
  [0,"BFC","CERTIFY"],
  [0,"BFC","CCW"],
// 
// 0 !HISTORY 2025-04-10 [Blechtaler] made from 86876 by [MMR1988]
// 0 !HISTORY 2025-07-27 [OrionP] Official Update 2025-07
// 
// 1 16 0 0 0 1 0 0 0 1 0 0 0 1 stug-1x2.dat
  [1,16,0,0,0,1,0,0,0,1,0,0,0,1, ldraw_lib__stug_1x2()],
// 
// 1 16 0 24 0 20 0 0 0 -24 0 0 0 10 box4t.dat
  [1,16,0,24,0,20,0,0,0,-24,0,0,0,10, ldraw_lib__box4t()],
// 0 BFC INVERTNEXT
  [0,"BFC","INVERTNEXT"],
// 1 16 0 24 0 16 0 0 0 -20 0 0 0 6 box4t.dat
  [1,16,0,24,0,16,0,0,0,-20,0,0,0,6, ldraw_lib__box4t()],
// 4 16 -20 24 10 -16 24 6 -16 24 -6 -20 24 -10
  [4,16,-20,24,10,-16,24,6,-16,24,-6,-20,24,-10],
// 4 16 20 24 -10 16 24 -6 16 24 6 20 24 10
  [4,16,20,24,-10,16,24,-6,16,24,6,20,24,10],
// 4 16 -20 24 -10 -16 24 -6 16 24 -6 20 24 -10
  [4,16,-20,24,-10,-16,24,-6,16,24,-6,20,24,-10],
// 4 16 -16 24 6 -20 24 10 20 24 10 16 24 6
  [4,16,-16,24,6,-20,24,10,20,24,10,16,24,6],
// 
// 1 16 0 10 -6 4 0 0 0 0 4 0 -1 0 4-4ndis.dat
  [1,16,0,10,-6,4,0,0,0,0,4,0,-1,0, ldraw_lib__4_4ndis()],
// 1 16 0 10 -6 4 0 0 0 0 4 0 1 0 4-4edge.dat
  [1,16,0,10,-6,4,0,0,0,0,4,0,1,0, ldraw_lib__4_4edge()],
// 4 16 0 6 -6 -4 6 -6 -16 4 -6 16 4 -6
  [4,16,0,6,-6,-4,6,-6,-16,4,-6,16,4,-6],
// 4 16 -4 10 -6 -4 14 -6 -16 24 -6 -16 4 -6
  [4,16,-4,10,-6,-4,14,-6,-16,24,-6,-16,4,-6],
// 4 16 -16 24 -6 0 14 -6 4 14 -6 16 24 -6
  [4,16,-16,24,-6,0,14,-6,4,14,-6,16,24,-6],
// 4 16 4 10 -6 4 6 -6 16 4 -6 16 24 -6
  [4,16,4,10,-6,4,6,-6,16,4,-6,16,24,-6],
// 3 16 16 4 -6 4 6 -6 0 6 -6
  [3,16,16,4,-6,4,6,-6,0,6,-6],
// 3 16 -4 6 -6 -4 10 -6 -16 4 -6
  [3,16,-4,6,-6,-4,10,-6,-16,4,-6],
// 3 16 -16 24 -6 -4 14 -6 0 14 -6
  [3,16,-16,24,-6,-4,14,-6,0,14,-6],
// 3 16 4 14 -6 4 10 -6 16 24 -6
  [3,16,4,14,-6,4,10,-6,16,24,-6],
// 
// 1 16 0 10 -10 1 0 0 0 0 1 0 1 0 stud2a.dat
  [1,16,0,10,-10,1,0,0,0,0,1,0,1,0, ldraw_lib__stud2a()],
// 0 BFC INVERTNEXT
  [0,"BFC","INVERTNEXT"],
// 1 16 0 10 -10 4 0 0 0 0 4 0 4 0 4-4cyli.dat
  [1,16,0,10,-10,4,0,0,0,0,4,0,4,0, ldraw_lib__4_4cyli()],
// 
// 1 16 0 10 -10 6 0 0 0 0 6 0 1 0 4-4ndis.dat
  [1,16,0,10,-10,6,0,0,0,0,6,0,1,0, ldraw_lib__4_4ndis()],
// 1 16 0 10 -10 6 0 0 0 0 6 0 1 0 4-4edge.dat
  [1,16,0,10,-10,6,0,0,0,0,6,0,1,0, ldraw_lib__4_4edge()],
// 4 16 -20 0 -10 -6 4 -10 0 4 -10 20 0 -10
  [4,16,-20,0,-10,-6,4,-10,0,4,-10,20,0,-10],
// 4 16 -20 24 -10 -6 16 -10 -6 10 -10 -20 0 -10
  [4,16,-20,24,-10,-6,16,-10,-6,10,-10,-20,0,-10],
// 4 16 6 16 -10 0 16 -10 -20 24 -10 20 24 -10
  [4,16,6,16,-10,0,16,-10,-20,24,-10,20,24,-10],
// 4 16 20 0 -10 6 4 -10 6 10 -10 20 24 -10
  [4,16,20,0,-10,6,4,-10,6,10,-10,20,24,-10],
// 3 16 6 4 -10 20 0 -10 0 4 -10
  [3,16,6,4,-10,20,0,-10,0,4,-10],
// 3 16 -6 10 -10 -6 4 -10 -20 0 -10
  [3,16,-6,10,-10,-6,4,-10,-20,0,-10],
// 3 16 -6 16 -10 -20 24 -10 0 16 -10
  [3,16,-6,16,-10,-20,24,-10,0,16,-10],
// 3 16 6 10 -10 6 16 -10 20 24 -10
  [3,16,6,10,-10,6,16,-10,20,24,-10],
];
module ldraw_lib__7133(step=0, col=false, unit=2/5, alt=false, line=0.2, solid=!$preview)
    makepoly(ldraw_lib__7133(), step=step, col=col, unit=unit, alt=alt, line=line, solid=solid);
ldraw_lib__7133(line=0.2);
